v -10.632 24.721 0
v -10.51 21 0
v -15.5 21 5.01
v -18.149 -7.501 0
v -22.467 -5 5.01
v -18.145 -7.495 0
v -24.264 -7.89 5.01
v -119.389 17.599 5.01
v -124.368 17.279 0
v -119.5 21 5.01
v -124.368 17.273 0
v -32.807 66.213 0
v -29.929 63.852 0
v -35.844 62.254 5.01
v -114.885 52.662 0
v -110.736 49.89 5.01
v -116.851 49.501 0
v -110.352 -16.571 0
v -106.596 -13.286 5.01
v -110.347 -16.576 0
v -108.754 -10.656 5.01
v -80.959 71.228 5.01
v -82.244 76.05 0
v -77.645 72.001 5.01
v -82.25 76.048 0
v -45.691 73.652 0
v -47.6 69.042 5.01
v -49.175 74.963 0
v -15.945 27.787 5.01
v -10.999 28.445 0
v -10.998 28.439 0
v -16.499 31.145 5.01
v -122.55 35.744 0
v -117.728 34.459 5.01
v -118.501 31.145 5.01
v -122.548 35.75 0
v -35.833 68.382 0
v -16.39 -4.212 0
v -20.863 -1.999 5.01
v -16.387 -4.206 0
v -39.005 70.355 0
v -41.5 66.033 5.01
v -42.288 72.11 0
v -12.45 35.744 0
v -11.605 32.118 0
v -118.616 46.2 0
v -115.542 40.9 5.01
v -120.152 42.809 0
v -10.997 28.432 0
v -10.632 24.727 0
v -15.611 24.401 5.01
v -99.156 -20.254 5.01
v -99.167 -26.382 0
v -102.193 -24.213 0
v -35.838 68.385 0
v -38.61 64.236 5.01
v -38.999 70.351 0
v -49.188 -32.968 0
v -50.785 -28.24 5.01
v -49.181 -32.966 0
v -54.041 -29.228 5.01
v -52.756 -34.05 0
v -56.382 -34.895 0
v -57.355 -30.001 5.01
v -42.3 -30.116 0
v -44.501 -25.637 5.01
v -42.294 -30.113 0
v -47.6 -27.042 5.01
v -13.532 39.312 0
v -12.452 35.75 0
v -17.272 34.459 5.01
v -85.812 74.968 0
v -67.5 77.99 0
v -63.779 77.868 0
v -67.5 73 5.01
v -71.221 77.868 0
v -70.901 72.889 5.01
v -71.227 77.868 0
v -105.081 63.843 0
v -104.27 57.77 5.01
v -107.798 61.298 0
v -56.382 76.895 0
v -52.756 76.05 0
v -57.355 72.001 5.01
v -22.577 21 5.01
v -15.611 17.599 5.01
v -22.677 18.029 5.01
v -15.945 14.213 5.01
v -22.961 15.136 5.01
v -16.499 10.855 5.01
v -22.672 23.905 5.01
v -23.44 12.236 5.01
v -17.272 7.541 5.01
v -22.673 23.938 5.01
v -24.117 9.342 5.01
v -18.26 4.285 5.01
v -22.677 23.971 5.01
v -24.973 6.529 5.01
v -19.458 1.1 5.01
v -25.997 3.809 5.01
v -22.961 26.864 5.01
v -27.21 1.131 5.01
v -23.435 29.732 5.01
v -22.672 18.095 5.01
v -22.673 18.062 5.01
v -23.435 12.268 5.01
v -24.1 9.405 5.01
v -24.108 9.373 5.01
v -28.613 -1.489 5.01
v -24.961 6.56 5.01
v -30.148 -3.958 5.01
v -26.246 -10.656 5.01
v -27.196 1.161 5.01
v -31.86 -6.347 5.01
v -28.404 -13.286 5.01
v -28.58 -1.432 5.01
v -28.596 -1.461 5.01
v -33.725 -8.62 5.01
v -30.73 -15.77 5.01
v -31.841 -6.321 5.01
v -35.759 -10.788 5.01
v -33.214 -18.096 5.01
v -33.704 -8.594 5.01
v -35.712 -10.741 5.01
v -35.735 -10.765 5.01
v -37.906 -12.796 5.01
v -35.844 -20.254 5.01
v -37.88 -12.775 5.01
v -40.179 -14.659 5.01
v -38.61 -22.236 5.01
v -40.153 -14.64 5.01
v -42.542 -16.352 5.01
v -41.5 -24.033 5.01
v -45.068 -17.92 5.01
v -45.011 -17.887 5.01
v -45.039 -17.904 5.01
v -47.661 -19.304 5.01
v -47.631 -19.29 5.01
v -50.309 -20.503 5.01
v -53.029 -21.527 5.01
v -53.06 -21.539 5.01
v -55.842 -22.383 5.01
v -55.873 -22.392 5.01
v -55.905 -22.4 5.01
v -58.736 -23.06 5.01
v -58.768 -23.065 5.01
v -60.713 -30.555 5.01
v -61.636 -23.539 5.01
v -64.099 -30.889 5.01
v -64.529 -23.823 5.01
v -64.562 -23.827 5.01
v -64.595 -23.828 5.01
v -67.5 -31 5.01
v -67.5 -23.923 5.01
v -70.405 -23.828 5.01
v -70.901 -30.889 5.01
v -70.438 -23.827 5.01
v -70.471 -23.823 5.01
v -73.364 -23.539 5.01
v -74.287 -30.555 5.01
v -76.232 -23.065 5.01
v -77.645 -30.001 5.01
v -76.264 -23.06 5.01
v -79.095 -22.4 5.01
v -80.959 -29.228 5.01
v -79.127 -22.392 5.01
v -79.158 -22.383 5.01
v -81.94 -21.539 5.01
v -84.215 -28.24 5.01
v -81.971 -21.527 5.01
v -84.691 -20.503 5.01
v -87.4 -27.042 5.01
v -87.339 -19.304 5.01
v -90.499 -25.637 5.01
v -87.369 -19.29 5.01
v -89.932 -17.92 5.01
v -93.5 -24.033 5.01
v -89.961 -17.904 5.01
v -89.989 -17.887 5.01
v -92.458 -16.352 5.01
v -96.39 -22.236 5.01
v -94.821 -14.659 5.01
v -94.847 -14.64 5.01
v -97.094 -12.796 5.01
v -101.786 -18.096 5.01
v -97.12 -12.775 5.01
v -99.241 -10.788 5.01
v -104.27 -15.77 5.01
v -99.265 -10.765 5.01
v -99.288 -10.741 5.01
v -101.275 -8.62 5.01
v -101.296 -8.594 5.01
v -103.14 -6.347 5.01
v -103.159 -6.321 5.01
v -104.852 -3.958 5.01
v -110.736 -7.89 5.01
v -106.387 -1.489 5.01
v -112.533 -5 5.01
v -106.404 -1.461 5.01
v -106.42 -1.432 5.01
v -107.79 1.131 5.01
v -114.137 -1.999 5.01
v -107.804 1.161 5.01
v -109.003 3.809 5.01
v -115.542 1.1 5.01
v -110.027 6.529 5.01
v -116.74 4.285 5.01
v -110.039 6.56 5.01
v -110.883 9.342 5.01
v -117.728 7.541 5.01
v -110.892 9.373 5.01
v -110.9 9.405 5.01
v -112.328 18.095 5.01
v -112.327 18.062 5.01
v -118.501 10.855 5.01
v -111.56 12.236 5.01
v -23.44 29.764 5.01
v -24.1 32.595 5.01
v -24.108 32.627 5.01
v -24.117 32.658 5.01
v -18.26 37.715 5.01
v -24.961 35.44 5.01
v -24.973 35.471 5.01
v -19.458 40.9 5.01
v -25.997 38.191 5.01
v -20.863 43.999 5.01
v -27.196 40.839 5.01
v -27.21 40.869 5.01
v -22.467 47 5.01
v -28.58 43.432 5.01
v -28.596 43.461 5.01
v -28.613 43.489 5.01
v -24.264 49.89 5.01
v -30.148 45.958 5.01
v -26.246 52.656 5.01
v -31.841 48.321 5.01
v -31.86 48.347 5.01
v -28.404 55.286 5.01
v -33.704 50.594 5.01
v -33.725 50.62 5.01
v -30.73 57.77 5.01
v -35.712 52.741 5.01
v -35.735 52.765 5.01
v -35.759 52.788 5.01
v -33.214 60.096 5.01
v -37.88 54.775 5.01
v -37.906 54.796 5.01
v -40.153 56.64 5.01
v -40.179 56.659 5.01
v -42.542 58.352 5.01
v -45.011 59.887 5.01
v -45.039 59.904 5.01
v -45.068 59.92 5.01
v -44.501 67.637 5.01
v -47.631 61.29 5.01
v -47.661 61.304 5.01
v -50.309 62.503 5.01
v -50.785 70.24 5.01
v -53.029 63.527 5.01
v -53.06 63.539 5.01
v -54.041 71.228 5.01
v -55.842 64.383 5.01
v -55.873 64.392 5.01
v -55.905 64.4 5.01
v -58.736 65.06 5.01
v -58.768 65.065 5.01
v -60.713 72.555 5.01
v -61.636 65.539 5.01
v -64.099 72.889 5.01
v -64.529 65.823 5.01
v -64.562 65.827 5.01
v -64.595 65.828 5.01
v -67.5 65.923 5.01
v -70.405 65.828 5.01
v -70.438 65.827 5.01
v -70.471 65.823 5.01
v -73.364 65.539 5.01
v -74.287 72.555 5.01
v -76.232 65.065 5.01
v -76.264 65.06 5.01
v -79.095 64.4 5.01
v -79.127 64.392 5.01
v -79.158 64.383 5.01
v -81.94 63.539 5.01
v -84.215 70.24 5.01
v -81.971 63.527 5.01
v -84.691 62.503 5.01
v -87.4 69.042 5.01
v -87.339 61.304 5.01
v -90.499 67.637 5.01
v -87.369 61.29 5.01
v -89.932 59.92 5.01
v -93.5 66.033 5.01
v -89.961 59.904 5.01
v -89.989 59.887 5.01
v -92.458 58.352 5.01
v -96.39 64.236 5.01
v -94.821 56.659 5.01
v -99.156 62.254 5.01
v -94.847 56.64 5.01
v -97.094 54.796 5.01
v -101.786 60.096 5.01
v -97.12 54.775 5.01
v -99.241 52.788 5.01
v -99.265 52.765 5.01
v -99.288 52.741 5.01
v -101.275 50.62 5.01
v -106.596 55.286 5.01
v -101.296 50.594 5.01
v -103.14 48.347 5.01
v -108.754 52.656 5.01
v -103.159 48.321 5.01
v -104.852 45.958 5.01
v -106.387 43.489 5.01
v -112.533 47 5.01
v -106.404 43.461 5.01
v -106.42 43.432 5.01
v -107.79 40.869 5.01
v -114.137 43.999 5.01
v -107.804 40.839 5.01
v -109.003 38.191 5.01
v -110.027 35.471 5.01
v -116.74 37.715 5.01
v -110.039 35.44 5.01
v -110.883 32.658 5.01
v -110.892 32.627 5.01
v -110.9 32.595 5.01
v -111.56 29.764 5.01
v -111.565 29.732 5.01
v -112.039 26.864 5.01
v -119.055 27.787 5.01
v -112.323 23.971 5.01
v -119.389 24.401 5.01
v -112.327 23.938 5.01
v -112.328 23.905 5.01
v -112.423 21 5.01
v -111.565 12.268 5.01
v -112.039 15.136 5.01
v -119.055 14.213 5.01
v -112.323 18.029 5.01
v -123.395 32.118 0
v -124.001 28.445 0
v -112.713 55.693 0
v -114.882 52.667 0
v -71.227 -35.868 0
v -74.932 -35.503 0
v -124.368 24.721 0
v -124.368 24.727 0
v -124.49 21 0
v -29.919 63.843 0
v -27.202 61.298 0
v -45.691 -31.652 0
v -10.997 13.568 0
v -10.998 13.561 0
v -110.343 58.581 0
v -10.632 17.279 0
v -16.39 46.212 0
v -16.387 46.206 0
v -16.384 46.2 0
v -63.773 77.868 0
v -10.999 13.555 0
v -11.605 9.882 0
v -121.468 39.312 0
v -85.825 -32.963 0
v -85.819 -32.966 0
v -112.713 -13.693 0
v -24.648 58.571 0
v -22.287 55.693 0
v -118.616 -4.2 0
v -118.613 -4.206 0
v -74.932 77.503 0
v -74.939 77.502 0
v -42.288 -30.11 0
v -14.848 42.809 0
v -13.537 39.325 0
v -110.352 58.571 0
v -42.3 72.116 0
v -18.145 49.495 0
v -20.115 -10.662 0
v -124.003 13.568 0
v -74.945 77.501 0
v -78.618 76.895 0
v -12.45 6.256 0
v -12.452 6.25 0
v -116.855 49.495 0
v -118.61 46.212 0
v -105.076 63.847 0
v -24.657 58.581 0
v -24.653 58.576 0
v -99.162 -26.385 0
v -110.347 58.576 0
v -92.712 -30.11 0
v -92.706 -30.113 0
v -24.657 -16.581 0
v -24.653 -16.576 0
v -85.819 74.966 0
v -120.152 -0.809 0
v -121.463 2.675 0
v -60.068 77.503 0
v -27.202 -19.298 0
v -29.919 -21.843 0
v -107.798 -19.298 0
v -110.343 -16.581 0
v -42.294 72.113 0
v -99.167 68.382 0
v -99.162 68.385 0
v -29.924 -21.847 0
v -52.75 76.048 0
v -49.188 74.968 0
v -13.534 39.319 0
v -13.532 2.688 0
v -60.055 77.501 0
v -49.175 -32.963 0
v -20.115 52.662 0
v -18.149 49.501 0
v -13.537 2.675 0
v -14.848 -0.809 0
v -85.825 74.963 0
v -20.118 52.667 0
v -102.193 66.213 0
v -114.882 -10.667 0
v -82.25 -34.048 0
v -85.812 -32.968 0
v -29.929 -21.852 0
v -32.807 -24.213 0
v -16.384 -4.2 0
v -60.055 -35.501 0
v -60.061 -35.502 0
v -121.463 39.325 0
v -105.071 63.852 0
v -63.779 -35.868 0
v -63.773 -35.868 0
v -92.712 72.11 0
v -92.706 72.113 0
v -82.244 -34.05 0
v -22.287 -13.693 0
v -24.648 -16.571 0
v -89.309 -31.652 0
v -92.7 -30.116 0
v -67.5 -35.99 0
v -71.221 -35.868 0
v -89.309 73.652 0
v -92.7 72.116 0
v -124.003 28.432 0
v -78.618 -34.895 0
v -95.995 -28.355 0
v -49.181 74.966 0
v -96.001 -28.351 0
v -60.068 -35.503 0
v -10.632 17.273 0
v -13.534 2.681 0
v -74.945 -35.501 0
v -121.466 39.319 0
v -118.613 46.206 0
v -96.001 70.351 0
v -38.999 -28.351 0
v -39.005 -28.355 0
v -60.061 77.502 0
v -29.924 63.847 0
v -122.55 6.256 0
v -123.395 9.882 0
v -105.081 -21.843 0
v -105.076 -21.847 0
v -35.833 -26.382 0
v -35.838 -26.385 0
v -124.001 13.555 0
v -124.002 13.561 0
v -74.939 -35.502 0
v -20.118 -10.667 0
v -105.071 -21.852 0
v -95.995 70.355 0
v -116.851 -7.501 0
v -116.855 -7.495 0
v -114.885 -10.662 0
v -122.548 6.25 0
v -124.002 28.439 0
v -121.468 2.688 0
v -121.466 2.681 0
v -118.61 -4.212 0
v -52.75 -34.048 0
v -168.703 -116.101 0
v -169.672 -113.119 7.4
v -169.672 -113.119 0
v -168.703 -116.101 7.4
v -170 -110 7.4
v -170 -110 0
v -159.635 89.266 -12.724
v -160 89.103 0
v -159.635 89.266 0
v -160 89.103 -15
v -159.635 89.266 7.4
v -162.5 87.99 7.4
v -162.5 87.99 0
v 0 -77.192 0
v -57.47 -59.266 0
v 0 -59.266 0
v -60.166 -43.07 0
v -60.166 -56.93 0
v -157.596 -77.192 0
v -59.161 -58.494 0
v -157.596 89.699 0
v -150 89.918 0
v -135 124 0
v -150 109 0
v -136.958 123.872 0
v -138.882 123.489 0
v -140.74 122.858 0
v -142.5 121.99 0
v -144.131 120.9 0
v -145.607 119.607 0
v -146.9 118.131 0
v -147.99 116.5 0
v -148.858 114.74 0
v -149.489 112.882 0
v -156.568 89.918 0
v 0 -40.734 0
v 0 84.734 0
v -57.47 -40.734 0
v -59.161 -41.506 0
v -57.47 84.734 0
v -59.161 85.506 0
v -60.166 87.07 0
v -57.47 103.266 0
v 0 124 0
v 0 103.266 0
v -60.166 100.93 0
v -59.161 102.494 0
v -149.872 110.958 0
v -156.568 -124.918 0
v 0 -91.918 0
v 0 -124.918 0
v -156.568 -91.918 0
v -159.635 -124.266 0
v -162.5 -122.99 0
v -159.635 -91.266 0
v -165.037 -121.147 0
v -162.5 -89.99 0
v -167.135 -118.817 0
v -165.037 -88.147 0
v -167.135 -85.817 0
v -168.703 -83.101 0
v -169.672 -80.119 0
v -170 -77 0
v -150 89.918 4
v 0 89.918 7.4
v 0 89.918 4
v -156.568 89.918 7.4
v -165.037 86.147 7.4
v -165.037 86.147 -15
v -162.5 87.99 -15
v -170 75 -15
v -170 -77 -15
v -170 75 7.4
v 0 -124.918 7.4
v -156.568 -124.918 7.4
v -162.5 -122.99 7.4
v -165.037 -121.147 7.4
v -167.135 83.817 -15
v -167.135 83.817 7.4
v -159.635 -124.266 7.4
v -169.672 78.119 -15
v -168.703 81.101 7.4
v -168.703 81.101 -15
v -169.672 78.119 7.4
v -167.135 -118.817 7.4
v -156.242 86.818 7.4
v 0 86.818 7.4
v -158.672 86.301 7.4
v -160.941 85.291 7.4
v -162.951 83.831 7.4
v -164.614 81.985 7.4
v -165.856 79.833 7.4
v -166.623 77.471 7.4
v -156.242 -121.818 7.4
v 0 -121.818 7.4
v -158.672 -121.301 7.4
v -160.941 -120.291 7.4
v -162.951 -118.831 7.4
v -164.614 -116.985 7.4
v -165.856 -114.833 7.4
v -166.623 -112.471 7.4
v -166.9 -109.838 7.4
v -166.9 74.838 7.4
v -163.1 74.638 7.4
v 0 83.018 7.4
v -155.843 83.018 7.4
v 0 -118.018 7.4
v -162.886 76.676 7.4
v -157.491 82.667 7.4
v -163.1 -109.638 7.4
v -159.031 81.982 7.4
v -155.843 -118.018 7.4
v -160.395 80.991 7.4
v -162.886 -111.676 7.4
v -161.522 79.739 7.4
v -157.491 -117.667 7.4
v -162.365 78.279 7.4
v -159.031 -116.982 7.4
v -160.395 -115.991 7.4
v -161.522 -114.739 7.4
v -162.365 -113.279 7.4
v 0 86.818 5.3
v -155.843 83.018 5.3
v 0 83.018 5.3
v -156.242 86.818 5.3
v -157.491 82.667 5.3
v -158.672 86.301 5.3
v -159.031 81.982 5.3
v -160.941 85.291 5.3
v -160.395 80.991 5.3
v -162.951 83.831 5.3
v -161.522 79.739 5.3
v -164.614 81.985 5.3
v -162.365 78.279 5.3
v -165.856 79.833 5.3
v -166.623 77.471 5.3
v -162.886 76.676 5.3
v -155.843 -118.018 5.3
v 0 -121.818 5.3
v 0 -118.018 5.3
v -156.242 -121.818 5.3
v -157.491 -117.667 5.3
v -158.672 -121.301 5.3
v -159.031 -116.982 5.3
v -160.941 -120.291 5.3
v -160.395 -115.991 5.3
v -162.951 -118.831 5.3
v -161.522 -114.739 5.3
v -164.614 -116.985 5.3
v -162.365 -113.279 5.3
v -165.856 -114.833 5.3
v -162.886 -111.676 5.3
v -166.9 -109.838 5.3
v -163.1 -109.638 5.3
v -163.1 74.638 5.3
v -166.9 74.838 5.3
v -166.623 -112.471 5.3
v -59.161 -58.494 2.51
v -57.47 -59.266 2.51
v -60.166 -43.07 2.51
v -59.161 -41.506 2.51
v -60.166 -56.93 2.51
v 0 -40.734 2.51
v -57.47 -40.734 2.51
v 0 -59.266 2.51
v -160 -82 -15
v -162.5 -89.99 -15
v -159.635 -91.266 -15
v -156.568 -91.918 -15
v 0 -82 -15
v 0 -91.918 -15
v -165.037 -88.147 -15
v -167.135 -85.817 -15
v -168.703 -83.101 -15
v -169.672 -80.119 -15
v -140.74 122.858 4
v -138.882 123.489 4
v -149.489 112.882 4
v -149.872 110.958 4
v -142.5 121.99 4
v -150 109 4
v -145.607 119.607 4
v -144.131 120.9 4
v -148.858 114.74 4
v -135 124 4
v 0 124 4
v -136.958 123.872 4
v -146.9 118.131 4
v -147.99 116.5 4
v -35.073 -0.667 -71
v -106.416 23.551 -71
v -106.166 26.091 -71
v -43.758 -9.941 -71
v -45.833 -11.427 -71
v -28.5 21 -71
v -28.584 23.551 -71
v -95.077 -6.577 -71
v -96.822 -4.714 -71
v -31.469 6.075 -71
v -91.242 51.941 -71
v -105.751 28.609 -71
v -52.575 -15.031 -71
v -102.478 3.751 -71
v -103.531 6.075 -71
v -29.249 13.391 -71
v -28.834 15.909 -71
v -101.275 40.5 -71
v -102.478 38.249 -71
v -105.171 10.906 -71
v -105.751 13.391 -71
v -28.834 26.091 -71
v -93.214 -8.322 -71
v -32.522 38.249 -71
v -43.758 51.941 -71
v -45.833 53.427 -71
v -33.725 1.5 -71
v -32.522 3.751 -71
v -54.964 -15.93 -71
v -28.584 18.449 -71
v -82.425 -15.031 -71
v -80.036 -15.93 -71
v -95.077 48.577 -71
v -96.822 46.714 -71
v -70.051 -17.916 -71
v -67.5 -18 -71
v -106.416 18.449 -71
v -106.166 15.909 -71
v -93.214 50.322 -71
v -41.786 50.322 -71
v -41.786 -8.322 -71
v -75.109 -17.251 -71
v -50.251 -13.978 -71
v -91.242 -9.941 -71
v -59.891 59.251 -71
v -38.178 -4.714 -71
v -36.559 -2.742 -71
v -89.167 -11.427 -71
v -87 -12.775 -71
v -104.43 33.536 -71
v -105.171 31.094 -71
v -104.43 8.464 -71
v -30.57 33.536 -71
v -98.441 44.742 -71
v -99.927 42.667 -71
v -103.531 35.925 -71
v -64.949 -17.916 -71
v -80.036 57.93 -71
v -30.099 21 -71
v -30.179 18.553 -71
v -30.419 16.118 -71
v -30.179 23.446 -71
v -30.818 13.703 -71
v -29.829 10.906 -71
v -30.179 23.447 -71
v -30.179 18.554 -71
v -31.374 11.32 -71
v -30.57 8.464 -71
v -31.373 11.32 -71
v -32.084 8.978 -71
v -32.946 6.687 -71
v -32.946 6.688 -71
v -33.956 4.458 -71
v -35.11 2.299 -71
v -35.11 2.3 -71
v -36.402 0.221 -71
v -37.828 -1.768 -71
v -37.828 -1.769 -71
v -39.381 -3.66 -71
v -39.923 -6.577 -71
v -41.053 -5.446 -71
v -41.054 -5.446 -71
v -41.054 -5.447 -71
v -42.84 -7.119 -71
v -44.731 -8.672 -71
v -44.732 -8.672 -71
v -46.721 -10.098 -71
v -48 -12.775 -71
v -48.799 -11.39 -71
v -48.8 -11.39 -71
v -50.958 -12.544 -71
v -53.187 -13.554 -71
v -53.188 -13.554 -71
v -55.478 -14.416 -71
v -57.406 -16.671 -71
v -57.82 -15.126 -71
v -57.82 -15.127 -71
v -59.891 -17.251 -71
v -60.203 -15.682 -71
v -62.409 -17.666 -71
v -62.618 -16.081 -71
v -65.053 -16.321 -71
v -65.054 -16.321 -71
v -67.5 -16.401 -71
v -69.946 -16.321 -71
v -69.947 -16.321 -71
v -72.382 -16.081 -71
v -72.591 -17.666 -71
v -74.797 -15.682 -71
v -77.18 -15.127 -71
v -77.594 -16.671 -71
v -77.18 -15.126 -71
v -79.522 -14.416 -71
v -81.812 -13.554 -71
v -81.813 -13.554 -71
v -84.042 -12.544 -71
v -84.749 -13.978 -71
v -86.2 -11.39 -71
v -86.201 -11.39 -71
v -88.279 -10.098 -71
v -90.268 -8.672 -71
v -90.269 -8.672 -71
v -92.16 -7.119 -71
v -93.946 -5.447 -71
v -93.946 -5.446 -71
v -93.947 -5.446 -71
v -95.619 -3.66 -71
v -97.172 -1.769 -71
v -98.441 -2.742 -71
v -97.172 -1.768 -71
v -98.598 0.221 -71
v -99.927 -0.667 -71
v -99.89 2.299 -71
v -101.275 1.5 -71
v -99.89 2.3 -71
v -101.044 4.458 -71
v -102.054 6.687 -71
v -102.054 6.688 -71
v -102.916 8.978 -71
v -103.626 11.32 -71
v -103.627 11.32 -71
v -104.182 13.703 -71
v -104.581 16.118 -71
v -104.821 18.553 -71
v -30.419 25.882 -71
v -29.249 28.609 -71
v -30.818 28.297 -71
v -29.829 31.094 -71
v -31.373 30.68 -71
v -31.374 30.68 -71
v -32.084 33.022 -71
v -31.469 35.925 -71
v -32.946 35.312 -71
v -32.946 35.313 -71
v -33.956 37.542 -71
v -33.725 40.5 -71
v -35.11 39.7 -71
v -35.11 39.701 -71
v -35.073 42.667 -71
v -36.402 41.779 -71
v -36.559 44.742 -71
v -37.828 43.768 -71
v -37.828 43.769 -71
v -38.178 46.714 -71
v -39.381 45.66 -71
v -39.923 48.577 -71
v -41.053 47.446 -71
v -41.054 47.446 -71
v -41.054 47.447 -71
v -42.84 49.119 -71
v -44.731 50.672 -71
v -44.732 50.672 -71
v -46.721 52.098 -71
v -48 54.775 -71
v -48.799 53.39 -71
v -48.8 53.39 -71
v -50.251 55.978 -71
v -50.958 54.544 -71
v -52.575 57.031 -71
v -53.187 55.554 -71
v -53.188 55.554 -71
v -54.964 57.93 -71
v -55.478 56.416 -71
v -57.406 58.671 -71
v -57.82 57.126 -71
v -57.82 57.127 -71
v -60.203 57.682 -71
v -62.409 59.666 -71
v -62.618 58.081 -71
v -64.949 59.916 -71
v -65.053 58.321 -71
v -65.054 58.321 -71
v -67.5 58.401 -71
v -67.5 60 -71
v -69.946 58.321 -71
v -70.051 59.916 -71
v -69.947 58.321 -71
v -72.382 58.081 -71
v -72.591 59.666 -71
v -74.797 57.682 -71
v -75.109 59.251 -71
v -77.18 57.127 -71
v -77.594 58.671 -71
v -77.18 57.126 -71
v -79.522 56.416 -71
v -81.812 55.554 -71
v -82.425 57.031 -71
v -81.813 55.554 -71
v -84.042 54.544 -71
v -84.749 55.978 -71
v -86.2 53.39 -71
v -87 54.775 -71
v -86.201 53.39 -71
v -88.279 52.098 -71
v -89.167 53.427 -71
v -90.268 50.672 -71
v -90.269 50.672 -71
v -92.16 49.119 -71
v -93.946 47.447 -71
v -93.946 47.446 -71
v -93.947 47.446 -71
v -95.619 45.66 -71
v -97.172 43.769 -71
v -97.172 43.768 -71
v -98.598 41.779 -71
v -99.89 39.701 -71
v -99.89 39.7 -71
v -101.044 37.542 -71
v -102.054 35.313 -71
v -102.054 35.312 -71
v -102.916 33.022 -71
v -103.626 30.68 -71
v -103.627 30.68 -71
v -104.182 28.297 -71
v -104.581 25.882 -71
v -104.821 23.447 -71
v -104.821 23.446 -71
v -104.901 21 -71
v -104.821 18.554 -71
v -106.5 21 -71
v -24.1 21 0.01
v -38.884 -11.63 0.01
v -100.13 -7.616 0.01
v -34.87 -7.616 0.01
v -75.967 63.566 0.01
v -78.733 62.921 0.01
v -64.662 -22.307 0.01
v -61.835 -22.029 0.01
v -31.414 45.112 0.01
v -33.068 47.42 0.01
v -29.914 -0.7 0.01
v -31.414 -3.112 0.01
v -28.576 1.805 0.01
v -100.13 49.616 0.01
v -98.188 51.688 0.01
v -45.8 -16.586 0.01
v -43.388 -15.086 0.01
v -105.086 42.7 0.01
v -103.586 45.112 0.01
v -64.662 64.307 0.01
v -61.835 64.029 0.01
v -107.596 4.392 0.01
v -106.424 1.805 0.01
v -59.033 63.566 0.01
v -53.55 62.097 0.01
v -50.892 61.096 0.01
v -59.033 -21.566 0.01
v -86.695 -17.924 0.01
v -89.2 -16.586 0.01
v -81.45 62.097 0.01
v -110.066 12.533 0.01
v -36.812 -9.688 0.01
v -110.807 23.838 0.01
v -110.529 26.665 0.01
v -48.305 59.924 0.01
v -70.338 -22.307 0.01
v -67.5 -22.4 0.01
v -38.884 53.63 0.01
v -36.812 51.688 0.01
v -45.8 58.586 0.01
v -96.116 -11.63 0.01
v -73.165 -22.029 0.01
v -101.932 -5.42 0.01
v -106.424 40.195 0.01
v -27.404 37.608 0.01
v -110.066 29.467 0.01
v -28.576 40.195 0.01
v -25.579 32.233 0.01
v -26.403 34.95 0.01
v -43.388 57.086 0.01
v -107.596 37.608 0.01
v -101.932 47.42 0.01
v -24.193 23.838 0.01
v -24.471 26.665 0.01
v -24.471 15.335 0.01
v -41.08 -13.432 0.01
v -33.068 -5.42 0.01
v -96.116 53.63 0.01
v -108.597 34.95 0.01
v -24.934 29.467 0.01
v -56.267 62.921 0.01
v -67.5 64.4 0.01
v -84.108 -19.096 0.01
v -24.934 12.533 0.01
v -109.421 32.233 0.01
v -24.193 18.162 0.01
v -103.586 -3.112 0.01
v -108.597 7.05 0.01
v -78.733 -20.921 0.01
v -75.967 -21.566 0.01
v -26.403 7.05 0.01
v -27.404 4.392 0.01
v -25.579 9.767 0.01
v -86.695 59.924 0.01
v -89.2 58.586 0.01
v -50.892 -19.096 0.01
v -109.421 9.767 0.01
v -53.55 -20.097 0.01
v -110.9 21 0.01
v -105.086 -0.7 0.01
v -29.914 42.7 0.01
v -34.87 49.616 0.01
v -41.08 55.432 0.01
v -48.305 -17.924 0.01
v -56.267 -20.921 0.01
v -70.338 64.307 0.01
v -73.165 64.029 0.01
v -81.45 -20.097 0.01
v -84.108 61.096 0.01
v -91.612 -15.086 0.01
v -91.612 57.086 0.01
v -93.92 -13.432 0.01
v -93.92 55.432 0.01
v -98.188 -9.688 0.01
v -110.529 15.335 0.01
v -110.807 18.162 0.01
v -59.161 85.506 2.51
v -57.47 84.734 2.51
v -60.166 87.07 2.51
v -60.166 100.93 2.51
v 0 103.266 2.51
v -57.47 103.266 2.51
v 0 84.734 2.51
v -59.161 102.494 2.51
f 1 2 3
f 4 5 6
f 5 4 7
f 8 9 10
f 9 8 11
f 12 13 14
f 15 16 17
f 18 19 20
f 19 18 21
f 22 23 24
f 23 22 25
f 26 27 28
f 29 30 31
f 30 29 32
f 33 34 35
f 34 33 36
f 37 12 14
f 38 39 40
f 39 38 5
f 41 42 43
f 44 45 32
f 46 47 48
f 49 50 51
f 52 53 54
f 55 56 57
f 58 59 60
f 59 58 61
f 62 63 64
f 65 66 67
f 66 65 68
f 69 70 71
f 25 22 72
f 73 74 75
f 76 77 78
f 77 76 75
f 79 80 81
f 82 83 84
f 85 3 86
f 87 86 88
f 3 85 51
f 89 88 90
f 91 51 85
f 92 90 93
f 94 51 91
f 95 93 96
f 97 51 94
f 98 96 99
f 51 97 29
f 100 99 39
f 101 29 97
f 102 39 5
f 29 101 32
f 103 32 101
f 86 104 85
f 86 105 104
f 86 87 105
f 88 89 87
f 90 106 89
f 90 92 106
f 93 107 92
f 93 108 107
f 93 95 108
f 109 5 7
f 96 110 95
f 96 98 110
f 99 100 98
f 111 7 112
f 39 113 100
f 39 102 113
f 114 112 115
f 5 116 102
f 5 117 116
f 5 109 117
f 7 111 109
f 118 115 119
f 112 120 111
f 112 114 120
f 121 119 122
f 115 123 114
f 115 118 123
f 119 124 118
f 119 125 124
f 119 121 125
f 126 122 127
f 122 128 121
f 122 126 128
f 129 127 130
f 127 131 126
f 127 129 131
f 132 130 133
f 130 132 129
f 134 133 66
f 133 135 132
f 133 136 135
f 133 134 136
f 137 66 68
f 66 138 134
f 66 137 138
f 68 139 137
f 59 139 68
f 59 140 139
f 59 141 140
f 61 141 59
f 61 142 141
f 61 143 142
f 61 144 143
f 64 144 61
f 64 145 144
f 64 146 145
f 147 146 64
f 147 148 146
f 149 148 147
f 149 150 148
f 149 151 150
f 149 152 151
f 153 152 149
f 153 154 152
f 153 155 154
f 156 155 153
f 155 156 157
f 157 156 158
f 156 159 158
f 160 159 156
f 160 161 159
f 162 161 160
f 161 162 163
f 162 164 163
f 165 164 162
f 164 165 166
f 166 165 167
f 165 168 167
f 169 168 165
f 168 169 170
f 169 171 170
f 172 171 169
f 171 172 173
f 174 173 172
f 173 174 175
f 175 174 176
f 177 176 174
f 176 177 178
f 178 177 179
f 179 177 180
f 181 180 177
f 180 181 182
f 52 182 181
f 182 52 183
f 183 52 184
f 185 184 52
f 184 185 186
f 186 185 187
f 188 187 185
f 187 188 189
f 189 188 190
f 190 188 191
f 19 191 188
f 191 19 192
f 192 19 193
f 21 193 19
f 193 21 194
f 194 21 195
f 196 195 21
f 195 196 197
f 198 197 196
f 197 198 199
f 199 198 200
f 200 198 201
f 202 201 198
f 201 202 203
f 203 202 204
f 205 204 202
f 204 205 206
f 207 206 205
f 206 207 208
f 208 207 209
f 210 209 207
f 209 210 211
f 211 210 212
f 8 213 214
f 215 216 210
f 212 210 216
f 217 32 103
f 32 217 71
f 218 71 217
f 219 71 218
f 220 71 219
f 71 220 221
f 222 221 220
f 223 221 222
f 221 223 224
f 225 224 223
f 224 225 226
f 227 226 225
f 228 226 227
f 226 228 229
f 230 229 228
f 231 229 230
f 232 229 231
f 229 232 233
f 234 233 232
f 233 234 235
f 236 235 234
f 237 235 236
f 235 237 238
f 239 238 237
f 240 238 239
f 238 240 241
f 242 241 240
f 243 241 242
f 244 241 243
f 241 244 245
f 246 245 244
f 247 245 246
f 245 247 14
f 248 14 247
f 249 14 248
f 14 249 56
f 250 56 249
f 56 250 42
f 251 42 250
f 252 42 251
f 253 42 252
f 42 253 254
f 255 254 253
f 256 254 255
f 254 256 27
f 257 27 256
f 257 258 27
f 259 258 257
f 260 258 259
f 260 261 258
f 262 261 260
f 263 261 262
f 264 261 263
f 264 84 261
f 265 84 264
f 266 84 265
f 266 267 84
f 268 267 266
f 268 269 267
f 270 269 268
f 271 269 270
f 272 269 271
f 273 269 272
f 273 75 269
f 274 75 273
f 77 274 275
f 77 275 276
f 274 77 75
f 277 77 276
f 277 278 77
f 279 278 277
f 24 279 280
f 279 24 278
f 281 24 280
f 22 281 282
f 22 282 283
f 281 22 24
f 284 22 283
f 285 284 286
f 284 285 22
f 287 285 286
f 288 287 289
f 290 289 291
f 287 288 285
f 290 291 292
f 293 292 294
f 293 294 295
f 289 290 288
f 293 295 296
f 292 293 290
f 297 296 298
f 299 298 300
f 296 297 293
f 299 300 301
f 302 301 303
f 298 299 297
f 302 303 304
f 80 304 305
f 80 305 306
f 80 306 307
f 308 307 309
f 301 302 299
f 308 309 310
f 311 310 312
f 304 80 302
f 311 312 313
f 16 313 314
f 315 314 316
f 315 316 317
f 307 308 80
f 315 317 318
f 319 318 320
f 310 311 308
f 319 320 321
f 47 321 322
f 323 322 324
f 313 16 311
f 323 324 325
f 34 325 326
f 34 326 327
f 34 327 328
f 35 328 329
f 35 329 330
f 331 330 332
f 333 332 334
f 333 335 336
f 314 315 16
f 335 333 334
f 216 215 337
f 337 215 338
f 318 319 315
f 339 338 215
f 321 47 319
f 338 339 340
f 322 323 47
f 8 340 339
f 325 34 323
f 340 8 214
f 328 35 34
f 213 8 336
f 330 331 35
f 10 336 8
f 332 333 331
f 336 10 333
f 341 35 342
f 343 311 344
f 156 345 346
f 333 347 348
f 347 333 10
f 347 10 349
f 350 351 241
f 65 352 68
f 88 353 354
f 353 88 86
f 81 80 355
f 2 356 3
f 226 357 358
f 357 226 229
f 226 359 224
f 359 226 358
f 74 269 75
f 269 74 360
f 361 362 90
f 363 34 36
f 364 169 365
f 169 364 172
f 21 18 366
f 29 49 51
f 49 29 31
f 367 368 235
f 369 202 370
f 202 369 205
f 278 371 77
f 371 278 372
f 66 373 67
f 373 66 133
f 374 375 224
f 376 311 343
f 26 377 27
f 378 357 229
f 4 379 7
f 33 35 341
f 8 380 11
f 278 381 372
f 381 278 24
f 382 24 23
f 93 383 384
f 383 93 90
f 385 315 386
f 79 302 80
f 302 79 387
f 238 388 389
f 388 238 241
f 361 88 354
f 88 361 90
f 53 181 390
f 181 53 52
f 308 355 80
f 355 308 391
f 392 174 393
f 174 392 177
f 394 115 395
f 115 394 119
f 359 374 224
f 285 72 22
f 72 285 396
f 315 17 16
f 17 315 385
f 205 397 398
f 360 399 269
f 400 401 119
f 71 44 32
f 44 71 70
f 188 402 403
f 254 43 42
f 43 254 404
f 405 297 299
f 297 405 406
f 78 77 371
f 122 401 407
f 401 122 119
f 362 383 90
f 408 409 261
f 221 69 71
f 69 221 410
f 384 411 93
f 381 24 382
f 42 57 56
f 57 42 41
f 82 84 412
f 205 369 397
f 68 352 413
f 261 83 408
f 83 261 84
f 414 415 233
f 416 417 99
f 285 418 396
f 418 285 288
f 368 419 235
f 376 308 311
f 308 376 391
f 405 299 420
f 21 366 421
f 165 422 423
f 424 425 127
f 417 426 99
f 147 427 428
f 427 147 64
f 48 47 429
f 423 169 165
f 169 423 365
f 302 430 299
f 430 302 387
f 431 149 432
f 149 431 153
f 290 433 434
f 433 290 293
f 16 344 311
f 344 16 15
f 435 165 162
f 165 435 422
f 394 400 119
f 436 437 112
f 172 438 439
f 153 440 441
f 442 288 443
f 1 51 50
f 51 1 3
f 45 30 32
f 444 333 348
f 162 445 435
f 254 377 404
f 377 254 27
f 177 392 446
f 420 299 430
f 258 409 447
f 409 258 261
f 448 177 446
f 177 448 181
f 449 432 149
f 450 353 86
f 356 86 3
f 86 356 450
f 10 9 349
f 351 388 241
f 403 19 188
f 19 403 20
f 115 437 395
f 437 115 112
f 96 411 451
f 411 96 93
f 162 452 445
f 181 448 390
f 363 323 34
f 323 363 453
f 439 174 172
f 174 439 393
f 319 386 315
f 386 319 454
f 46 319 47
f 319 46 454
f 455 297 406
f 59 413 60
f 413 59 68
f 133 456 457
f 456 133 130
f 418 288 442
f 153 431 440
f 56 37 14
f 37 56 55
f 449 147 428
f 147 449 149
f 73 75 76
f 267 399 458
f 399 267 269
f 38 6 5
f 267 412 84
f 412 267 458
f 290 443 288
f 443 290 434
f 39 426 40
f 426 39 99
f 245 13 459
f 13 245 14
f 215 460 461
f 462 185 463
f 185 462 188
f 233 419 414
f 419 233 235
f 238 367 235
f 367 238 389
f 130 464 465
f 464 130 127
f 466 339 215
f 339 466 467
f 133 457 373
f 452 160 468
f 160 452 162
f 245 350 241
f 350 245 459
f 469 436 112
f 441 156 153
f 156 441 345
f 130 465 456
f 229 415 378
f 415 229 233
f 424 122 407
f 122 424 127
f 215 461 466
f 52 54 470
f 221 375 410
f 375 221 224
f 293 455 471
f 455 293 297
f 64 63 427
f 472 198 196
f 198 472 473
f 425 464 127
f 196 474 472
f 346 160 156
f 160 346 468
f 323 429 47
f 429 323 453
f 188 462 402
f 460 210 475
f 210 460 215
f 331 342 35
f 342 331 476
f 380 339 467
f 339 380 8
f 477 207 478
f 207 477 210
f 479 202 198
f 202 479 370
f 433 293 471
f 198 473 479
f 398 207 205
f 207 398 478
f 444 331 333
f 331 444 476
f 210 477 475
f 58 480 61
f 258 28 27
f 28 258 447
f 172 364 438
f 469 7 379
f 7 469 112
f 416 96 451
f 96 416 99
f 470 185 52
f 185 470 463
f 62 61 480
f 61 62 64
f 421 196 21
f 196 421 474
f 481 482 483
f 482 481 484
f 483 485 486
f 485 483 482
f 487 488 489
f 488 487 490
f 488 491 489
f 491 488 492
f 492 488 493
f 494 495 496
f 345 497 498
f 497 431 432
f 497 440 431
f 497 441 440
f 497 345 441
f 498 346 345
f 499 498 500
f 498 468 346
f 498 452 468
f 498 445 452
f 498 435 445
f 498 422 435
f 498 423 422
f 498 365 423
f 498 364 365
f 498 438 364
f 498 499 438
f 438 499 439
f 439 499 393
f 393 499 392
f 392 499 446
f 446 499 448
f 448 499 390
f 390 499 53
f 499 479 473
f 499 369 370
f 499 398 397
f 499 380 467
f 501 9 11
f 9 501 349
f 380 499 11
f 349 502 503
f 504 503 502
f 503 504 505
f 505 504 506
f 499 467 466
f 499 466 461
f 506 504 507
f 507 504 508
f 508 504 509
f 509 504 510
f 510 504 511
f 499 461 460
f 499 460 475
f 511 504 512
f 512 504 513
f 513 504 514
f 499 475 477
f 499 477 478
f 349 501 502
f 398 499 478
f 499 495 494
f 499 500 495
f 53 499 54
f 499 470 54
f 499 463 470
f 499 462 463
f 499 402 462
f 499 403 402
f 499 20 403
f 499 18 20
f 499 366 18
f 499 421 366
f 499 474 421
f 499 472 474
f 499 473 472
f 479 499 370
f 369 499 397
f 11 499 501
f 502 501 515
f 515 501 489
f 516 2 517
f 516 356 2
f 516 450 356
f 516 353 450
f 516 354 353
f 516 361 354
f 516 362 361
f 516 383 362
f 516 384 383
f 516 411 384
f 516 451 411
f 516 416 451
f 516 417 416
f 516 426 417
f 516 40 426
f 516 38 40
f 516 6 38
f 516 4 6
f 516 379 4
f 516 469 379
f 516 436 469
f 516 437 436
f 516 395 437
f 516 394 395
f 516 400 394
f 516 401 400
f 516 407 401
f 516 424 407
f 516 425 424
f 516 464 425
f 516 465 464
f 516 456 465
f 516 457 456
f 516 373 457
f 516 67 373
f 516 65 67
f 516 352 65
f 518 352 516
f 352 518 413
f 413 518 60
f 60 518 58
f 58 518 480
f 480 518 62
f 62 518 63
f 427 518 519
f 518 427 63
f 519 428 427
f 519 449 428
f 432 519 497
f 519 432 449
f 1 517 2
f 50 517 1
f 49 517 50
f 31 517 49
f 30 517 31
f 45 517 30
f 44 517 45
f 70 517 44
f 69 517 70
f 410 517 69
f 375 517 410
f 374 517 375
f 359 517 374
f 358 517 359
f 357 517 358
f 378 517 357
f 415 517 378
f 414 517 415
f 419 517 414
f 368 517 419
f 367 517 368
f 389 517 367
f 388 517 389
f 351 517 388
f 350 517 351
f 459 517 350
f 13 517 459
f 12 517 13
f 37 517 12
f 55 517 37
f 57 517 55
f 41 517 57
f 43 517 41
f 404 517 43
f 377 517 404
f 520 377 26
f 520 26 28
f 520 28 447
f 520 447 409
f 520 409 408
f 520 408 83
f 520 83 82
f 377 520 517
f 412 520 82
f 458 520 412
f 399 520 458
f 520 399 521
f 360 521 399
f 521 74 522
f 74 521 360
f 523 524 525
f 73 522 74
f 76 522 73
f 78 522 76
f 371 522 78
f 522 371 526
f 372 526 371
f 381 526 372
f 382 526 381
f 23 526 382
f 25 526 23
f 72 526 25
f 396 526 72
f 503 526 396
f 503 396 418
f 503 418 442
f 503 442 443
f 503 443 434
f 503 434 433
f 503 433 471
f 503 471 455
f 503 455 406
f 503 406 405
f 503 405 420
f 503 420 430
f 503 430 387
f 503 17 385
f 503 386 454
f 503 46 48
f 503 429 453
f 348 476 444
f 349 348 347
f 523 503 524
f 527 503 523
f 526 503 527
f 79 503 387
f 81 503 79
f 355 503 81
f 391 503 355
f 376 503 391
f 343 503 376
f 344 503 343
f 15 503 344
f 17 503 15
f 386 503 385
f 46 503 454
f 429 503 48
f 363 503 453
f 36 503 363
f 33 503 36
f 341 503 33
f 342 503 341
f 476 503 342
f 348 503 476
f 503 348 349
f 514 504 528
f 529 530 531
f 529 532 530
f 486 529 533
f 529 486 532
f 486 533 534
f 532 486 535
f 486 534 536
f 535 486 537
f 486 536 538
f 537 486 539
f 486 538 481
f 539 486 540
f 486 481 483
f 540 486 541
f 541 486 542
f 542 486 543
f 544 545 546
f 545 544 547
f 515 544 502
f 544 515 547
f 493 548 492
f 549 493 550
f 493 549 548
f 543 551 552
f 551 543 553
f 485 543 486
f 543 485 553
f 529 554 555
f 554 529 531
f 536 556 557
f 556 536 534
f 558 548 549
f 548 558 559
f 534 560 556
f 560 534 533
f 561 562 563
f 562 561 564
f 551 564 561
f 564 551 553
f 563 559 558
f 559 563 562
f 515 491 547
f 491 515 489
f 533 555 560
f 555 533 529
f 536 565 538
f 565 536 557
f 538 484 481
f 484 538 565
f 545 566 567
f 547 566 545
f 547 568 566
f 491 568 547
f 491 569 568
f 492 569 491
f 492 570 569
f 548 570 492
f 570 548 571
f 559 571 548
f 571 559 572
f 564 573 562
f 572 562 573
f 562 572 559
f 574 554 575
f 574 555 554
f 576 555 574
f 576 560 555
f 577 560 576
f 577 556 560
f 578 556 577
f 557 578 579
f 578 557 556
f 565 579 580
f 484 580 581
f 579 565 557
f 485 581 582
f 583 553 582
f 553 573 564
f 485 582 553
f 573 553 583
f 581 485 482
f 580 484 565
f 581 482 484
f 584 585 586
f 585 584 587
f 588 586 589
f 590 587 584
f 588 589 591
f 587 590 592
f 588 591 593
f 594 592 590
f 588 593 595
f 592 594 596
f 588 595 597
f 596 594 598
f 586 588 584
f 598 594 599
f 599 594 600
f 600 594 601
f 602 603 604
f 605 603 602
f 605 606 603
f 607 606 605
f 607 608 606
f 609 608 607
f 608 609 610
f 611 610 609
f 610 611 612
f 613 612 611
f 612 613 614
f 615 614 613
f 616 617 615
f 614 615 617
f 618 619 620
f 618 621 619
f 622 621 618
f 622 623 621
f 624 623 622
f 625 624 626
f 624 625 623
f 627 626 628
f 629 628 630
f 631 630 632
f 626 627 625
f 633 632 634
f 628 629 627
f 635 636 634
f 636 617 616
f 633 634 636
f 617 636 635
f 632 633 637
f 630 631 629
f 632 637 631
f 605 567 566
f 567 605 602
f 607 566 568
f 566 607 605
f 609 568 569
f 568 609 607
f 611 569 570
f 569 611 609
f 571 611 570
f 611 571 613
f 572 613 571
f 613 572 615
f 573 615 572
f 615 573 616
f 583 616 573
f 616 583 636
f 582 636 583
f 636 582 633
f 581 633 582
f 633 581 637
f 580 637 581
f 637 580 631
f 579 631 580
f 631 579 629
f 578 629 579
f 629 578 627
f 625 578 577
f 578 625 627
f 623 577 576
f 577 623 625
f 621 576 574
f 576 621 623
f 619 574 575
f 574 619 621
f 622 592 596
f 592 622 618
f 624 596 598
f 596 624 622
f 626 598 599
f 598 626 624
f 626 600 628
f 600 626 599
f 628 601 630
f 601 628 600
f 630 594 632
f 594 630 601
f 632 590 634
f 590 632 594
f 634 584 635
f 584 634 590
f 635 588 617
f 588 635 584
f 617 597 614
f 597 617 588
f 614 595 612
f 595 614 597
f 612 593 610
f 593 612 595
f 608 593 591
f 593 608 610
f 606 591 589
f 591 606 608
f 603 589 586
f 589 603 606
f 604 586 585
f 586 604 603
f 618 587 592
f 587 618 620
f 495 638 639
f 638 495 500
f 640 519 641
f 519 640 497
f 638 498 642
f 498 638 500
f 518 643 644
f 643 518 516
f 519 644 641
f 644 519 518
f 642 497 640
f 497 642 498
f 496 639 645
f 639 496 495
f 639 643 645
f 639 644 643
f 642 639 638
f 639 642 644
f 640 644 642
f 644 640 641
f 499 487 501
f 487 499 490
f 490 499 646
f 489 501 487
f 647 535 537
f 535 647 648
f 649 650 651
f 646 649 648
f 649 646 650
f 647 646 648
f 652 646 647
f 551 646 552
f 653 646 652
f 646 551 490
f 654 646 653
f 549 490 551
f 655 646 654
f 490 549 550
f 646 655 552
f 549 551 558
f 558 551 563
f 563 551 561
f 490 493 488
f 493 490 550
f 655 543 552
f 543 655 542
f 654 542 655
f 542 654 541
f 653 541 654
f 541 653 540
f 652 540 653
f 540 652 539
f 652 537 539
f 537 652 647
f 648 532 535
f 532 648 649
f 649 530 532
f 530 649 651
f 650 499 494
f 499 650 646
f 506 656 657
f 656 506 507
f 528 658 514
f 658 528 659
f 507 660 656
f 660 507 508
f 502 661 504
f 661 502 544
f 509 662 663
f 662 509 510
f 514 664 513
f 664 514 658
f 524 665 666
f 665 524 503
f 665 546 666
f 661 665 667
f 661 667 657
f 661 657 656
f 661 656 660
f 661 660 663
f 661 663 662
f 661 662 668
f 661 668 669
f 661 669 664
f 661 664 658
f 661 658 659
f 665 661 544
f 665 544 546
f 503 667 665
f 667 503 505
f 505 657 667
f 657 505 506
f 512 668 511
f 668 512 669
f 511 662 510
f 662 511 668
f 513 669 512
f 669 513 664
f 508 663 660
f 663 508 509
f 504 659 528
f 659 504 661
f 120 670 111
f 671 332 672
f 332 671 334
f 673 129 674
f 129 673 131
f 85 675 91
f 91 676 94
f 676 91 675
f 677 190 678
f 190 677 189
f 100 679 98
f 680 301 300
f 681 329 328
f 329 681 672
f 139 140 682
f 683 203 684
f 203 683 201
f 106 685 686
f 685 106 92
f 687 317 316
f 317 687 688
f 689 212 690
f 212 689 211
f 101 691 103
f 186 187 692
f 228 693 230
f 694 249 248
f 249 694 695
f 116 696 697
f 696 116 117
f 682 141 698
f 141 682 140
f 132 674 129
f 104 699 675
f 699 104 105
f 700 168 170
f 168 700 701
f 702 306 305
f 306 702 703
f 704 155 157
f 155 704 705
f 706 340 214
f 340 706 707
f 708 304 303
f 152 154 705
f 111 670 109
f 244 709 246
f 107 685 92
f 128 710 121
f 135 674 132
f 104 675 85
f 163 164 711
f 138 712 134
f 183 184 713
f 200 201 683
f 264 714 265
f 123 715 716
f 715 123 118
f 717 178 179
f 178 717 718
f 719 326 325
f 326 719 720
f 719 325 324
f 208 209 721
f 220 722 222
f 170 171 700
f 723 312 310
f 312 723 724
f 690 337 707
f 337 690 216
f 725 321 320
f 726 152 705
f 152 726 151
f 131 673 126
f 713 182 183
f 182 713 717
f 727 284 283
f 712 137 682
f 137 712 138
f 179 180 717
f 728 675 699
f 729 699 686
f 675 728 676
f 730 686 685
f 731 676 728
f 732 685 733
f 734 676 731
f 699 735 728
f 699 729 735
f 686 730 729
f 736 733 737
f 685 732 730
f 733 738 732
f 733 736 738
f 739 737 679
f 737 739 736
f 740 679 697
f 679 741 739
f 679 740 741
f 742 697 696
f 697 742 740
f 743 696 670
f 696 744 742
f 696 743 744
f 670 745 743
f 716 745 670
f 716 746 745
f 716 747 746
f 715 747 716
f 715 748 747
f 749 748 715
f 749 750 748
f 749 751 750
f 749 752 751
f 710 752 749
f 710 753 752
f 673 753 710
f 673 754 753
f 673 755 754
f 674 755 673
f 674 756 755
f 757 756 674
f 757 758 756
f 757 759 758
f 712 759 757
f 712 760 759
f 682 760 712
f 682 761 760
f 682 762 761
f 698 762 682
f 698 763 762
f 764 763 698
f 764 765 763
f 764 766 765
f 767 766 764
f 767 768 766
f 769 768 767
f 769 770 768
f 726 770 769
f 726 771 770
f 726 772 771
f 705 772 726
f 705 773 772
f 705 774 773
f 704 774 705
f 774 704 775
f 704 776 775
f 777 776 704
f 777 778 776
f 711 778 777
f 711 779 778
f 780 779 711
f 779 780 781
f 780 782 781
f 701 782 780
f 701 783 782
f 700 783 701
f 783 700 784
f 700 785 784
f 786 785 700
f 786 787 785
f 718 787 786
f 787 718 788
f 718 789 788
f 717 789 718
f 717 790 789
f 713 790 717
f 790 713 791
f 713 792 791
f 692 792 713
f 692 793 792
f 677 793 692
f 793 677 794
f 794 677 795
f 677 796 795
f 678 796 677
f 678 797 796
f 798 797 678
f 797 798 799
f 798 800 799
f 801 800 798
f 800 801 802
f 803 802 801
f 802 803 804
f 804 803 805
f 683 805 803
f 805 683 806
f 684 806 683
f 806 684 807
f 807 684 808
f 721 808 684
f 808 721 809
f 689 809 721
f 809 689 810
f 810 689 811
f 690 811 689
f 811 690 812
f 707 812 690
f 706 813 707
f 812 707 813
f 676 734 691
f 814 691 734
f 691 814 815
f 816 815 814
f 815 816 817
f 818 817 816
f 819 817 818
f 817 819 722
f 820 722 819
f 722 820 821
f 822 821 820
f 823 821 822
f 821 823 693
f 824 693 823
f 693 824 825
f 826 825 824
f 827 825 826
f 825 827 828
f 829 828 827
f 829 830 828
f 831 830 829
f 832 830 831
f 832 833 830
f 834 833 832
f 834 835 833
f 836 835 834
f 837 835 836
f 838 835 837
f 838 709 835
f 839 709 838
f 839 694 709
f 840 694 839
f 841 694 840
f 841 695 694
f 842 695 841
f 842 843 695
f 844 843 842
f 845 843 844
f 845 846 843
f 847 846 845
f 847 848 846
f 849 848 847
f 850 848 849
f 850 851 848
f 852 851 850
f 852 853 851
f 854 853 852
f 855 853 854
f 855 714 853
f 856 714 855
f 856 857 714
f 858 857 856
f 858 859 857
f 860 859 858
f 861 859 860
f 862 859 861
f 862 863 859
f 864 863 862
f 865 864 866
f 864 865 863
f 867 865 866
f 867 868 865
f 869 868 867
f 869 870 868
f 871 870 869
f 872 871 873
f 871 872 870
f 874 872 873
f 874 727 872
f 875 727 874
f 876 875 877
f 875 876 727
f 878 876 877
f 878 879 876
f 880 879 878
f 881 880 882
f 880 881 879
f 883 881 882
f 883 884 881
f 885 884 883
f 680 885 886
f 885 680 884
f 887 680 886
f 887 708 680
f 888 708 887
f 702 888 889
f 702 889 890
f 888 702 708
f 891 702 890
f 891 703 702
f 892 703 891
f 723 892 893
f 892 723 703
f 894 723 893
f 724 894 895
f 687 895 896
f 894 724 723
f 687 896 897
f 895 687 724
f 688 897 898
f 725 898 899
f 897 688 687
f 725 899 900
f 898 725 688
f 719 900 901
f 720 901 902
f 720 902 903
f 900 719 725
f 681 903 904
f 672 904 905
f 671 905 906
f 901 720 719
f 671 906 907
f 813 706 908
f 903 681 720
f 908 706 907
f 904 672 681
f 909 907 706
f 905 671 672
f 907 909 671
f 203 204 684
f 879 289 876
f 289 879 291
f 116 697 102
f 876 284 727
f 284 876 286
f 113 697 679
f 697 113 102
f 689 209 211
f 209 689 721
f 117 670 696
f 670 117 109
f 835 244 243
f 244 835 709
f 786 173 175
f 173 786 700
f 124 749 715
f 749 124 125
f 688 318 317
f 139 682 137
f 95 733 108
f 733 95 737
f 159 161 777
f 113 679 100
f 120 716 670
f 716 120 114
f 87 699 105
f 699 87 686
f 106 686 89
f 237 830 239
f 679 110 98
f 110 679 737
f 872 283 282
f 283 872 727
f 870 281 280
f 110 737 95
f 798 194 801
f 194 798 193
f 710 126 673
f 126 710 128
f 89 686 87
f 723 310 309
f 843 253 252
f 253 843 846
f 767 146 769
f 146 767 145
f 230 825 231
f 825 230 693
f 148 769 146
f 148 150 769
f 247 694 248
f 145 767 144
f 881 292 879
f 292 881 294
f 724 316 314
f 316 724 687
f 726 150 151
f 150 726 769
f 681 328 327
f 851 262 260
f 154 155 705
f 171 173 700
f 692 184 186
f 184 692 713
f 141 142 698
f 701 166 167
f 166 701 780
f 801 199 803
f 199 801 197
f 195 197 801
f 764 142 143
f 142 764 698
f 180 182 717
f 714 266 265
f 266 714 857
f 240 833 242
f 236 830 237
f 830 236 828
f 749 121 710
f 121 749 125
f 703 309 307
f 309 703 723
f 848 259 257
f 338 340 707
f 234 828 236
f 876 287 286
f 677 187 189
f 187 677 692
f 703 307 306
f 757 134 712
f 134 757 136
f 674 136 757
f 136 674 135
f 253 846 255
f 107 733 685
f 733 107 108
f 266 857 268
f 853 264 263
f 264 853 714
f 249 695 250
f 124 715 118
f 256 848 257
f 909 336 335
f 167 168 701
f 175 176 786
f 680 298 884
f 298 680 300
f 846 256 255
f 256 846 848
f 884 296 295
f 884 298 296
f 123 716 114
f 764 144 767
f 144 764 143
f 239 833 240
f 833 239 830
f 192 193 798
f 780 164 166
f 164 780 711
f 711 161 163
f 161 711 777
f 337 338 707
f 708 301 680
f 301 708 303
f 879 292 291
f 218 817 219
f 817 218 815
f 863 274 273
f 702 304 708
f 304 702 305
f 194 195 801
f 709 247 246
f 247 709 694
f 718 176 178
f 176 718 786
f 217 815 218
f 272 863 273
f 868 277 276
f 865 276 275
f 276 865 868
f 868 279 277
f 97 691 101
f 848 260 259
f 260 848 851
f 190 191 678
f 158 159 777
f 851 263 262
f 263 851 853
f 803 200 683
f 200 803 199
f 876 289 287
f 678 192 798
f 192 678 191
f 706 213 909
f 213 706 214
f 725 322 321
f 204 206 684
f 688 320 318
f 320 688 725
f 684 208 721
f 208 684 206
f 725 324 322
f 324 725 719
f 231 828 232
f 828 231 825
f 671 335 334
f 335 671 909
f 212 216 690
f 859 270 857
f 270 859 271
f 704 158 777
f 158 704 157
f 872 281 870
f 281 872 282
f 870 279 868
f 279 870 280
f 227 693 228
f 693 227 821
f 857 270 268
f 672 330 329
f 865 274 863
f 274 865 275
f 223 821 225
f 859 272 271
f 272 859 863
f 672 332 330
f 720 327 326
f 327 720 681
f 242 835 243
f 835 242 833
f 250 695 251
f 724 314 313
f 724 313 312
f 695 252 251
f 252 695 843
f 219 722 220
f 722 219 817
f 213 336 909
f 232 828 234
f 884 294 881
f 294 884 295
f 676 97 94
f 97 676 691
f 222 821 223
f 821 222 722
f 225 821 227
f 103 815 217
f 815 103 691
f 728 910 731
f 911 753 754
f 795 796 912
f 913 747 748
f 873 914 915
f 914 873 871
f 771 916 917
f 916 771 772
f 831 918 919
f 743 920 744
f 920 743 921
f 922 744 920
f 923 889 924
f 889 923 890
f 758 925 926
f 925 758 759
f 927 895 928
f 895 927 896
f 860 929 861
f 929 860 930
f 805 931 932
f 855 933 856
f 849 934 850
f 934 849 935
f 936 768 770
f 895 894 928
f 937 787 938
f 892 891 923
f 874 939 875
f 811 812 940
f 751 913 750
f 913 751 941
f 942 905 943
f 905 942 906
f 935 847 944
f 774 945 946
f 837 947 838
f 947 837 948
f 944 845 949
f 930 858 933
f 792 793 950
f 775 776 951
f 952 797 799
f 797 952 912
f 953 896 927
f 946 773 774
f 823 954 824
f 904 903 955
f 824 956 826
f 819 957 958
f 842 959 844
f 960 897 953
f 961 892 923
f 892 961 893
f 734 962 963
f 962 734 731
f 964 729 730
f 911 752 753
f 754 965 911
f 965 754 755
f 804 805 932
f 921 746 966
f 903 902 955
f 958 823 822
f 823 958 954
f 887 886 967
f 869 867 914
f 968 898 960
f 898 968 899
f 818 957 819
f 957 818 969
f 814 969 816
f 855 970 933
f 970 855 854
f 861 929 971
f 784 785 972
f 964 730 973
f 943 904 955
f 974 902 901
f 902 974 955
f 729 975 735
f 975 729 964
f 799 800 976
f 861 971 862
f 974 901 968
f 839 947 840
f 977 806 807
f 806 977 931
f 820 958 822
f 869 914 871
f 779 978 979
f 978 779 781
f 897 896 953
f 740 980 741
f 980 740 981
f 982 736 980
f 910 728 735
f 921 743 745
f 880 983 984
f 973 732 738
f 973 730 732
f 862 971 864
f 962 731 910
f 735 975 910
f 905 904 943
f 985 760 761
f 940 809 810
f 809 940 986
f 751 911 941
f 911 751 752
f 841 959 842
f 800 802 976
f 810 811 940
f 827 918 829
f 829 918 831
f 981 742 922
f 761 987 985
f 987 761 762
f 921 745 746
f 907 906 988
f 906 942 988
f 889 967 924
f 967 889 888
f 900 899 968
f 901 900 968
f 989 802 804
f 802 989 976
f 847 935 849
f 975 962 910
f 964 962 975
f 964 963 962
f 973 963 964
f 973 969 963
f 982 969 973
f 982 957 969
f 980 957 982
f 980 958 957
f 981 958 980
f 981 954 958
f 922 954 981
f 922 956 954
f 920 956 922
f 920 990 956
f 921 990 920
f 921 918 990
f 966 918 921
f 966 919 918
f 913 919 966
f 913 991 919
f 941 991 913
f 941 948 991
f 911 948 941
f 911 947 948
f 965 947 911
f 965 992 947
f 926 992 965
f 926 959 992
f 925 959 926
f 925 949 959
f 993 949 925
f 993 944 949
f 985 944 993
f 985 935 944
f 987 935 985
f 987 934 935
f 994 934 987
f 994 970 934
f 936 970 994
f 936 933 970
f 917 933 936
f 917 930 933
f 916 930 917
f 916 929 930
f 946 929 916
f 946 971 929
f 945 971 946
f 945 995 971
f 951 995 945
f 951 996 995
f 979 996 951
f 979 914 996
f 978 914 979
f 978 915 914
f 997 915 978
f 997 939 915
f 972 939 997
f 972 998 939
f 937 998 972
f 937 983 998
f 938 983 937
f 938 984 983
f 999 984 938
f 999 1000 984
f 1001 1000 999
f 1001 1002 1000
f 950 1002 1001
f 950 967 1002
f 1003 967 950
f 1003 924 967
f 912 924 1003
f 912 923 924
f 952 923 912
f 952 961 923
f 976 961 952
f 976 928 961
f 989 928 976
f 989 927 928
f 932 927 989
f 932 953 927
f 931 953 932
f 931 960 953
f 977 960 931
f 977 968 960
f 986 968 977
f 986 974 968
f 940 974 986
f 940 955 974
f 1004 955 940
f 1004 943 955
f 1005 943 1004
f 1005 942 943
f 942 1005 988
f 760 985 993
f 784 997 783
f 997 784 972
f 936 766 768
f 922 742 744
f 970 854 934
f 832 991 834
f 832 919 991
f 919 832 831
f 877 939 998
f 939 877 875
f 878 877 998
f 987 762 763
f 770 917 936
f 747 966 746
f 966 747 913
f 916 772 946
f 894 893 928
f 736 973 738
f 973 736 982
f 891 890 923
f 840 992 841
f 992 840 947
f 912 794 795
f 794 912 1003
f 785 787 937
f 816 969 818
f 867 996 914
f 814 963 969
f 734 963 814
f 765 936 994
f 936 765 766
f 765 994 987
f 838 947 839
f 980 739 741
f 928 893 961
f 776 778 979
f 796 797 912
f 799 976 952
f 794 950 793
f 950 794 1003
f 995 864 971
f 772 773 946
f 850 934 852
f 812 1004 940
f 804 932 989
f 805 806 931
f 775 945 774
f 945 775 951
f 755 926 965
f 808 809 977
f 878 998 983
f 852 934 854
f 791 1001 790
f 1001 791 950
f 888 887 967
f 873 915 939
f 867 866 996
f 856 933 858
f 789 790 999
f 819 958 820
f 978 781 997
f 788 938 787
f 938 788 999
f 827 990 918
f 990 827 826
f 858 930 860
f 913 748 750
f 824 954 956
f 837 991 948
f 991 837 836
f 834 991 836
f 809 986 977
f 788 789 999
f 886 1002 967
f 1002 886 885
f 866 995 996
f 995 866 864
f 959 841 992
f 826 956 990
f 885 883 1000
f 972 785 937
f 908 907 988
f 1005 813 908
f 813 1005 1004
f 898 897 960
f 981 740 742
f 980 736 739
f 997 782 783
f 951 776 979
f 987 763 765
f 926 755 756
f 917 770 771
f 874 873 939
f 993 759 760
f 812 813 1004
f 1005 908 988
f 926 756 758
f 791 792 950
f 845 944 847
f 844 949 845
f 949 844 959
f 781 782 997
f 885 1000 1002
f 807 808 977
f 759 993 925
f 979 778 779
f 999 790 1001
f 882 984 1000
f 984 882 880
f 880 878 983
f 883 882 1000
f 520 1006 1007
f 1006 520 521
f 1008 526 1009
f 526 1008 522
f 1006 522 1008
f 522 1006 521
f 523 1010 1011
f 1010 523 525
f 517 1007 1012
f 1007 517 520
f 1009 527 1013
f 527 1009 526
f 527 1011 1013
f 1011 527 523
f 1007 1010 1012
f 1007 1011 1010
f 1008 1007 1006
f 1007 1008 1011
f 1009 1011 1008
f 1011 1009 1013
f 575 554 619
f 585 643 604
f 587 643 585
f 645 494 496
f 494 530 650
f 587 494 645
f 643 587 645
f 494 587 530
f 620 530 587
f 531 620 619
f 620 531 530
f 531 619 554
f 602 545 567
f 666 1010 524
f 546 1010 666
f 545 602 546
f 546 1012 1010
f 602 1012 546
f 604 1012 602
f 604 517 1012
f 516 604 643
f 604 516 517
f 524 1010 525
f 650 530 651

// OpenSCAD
// file: ../lib/project/util.scad
// lib/project/util.scad

module rounded_rect_2d(size = [10, 10], r = 2) {
  x = size[0];
  y = size[1];
  rr = min(r, min(x, y) / 2);

  hull() {
    for (sx = [-1, 1], sy = [-1, 1]) {
      translate([sx * (x / 2 - rr), sy * (y / 2 - rr)])
        circle(r = rr);
    }
  }
}
// file: ../lib/project/params.scad
// lib/project/params.scad
// Shared project parameters for the final tray and all fit-test models.

debug = false;

// Main tray footprint.
tray_corner_r = 15;

// Top tray shell.
tray_floor_t = 2.4;
tray_wall_h = 14;
top_wall_w = 10;
glue_rabbet_h = 1.6;
glue_rabbet_w = 3.2;
glue_rabbet_side_clearance = 0.3;
glue_rabbet_vertical_clearance = 0.5;

// Underside support lip and rear support section.
support_lip_drop = 15;
support_lip_w = 10;
front_lip_forward_shift = 2;
front_lip_back_extra = 5;
front_lip_bottom_back_extra = 0;
side_lip_inner_extra = 2.5;
side_lip_bottom_inner_extra = 0;
console_clear_w = 320;
side_lip_run = 170;
tray_w = console_clear_w + 2 * support_lip_w;
tray_d = side_lip_run + support_lip_w;
front_extension = 35;
rear_gap_w = 28;
rear_tongue_side_margin = 20;
rear_tongue_w = tray_w - 2 * rear_tongue_side_margin;
rear_tongue_depth = 34;
rear_tongue_t = 4.0;

// Cup holder location and plug geometry.
cup_spacing = 135;
// Confirmed from fit checks: move plugs 39 mm rearward from the prior position.
cup_y_from_front = 111;
plug_top_d = 90;
plug_bottom_d = 78;
plug_h = 71;
plug_shell_t = 1.6;
plug_clearance_z = 0;
cup_rim_w = 7;
cup_rim_h = 5;

// Optional underside splice plate for joining printed tray halves.
splice_plate_enable = true;
splice_plate_w = 120;
splice_plate_d = 18;
splice_plate_t = 2;
splice_plate_corner_r = 3;
splice_plate_y_from_front = 40;
splice_plate_side_clearance = 0.3;
splice_plate_vertical_clearance = 0.5;
rear_splice_plate_enable = true;
rear_splice_plate_y_from_front = 184;

// Fit-test defaults.
test_plug_top_ds = [84, 85, 86];
test_spacing_values = [116, 118, 120];
test_lip_drop_values = [8, 10, 12];
test_rear_tongue_ts = [1.4, 1.8, 2.2];
test_frame_wall_w = 12;
test_front_zone_depth = 100;
test_rear_zone_depth = 56;
test_gap_section_w = 140;
test_coupon_spacing = 18;
test_front_to_back_slice_w = 10;
test_side_to_side_slice_w = 10;
test_rabbet_corner_section_size = 56;
test_rabbet_coupon_gap = 16;
test_rabbet_body_margin_from_groove = 15;
// main file
// models/half_tray.scad
// Printable half of the full tray for smaller print beds.

use <../lib/project/console_tray.scad>;
include <../lib/project/params.scad>;

// ---------- Public parameters (mm) ----------
// Set false to export the opposite half without changing the shared tray model.
keep_left_half = true;

module full_tray() {
  tray_body_variant(
    tray_w = tray_w,
    tray_d = tray_d,
    front_extension = front_extension,
    tray_corner_r = tray_corner_r,
    tray_floor_t = tray_floor_t,
    top_wall_w = top_wall_w,
    glue_rabbet_h = glue_rabbet_h,
    glue_rabbet_w = glue_rabbet_w,
    glue_rabbet_side_clearance = glue_rabbet_side_clearance,
    glue_rabbet_vertical_clearance = glue_rabbet_vertical_clearance,
    support_lip_drop = support_lip_drop,
    support_lip_w = support_lip_w,
    front_lip_forward_shift = front_lip_forward_shift,
    front_lip_back_extra = front_lip_back_extra,
    front_lip_bottom_back_extra = front_lip_bottom_back_extra,
    side_lip_inner_extra = side_lip_inner_extra,
    side_lip_bottom_inner_extra = side_lip_bottom_inner_extra,
    rear_gap_w = rear_gap_w,
    rear_tongue_w = rear_tongue_w,
    rear_tongue_depth = rear_tongue_depth,
    rear_tongue_t = rear_tongue_t,
    cup_spacing = cup_spacing,
    cup_y_from_front = cup_y_from_front,
    plug_top_d = plug_top_d,
    plug_bottom_d = plug_bottom_d,
    plug_h = plug_h,
    plug_shell_t = plug_shell_t,
    cup_rim_w = cup_rim_w,
    cup_rim_h = cup_rim_h,
    splice_plate_enable = splice_plate_enable,
    splice_plate_w = splice_plate_w,
    splice_plate_d = splice_plate_d,
    splice_plate_t = splice_plate_t,
    splice_plate_corner_r = splice_plate_corner_r,
    splice_plate_y_from_front = splice_plate_y_from_front,
    splice_plate_side_clearance = splice_plate_side_clearance,
    splice_plate_vertical_clearance = splice_plate_vertical_clearance,
    rear_splice_plate_enable = rear_splice_plate_enable,
    rear_splice_plate_y_from_front = rear_splice_plate_y_from_front,
    plug_clearance_z = plug_clearance_z,
    debug = debug
  );
}

module half_tray(keep_left_half = true) {
  base_h = tray_base_h(tray_floor_t, cup_rim_h);
  cut_x = max(tray_w, rear_tongue_w, cup_spacing + plug_top_d) + 20;
  cut_y = tray_d + front_extension + rear_tongue_depth + 20;
  cut_z = plug_h + support_lip_drop + base_h + 20;
  keep_sign = keep_left_half ? 1 : -1;

  difference() {
    full_tray();

    // Remove one side at the center plane so the remaining half can be mirrored.
    translate([keep_sign * cut_x / 4, 0, (base_h - plug_h - support_lip_drop) / 2])
      cube([cut_x / 2, cut_y, cut_z], center = true);
  }
}

half_tray(keep_left_half = keep_left_half);
